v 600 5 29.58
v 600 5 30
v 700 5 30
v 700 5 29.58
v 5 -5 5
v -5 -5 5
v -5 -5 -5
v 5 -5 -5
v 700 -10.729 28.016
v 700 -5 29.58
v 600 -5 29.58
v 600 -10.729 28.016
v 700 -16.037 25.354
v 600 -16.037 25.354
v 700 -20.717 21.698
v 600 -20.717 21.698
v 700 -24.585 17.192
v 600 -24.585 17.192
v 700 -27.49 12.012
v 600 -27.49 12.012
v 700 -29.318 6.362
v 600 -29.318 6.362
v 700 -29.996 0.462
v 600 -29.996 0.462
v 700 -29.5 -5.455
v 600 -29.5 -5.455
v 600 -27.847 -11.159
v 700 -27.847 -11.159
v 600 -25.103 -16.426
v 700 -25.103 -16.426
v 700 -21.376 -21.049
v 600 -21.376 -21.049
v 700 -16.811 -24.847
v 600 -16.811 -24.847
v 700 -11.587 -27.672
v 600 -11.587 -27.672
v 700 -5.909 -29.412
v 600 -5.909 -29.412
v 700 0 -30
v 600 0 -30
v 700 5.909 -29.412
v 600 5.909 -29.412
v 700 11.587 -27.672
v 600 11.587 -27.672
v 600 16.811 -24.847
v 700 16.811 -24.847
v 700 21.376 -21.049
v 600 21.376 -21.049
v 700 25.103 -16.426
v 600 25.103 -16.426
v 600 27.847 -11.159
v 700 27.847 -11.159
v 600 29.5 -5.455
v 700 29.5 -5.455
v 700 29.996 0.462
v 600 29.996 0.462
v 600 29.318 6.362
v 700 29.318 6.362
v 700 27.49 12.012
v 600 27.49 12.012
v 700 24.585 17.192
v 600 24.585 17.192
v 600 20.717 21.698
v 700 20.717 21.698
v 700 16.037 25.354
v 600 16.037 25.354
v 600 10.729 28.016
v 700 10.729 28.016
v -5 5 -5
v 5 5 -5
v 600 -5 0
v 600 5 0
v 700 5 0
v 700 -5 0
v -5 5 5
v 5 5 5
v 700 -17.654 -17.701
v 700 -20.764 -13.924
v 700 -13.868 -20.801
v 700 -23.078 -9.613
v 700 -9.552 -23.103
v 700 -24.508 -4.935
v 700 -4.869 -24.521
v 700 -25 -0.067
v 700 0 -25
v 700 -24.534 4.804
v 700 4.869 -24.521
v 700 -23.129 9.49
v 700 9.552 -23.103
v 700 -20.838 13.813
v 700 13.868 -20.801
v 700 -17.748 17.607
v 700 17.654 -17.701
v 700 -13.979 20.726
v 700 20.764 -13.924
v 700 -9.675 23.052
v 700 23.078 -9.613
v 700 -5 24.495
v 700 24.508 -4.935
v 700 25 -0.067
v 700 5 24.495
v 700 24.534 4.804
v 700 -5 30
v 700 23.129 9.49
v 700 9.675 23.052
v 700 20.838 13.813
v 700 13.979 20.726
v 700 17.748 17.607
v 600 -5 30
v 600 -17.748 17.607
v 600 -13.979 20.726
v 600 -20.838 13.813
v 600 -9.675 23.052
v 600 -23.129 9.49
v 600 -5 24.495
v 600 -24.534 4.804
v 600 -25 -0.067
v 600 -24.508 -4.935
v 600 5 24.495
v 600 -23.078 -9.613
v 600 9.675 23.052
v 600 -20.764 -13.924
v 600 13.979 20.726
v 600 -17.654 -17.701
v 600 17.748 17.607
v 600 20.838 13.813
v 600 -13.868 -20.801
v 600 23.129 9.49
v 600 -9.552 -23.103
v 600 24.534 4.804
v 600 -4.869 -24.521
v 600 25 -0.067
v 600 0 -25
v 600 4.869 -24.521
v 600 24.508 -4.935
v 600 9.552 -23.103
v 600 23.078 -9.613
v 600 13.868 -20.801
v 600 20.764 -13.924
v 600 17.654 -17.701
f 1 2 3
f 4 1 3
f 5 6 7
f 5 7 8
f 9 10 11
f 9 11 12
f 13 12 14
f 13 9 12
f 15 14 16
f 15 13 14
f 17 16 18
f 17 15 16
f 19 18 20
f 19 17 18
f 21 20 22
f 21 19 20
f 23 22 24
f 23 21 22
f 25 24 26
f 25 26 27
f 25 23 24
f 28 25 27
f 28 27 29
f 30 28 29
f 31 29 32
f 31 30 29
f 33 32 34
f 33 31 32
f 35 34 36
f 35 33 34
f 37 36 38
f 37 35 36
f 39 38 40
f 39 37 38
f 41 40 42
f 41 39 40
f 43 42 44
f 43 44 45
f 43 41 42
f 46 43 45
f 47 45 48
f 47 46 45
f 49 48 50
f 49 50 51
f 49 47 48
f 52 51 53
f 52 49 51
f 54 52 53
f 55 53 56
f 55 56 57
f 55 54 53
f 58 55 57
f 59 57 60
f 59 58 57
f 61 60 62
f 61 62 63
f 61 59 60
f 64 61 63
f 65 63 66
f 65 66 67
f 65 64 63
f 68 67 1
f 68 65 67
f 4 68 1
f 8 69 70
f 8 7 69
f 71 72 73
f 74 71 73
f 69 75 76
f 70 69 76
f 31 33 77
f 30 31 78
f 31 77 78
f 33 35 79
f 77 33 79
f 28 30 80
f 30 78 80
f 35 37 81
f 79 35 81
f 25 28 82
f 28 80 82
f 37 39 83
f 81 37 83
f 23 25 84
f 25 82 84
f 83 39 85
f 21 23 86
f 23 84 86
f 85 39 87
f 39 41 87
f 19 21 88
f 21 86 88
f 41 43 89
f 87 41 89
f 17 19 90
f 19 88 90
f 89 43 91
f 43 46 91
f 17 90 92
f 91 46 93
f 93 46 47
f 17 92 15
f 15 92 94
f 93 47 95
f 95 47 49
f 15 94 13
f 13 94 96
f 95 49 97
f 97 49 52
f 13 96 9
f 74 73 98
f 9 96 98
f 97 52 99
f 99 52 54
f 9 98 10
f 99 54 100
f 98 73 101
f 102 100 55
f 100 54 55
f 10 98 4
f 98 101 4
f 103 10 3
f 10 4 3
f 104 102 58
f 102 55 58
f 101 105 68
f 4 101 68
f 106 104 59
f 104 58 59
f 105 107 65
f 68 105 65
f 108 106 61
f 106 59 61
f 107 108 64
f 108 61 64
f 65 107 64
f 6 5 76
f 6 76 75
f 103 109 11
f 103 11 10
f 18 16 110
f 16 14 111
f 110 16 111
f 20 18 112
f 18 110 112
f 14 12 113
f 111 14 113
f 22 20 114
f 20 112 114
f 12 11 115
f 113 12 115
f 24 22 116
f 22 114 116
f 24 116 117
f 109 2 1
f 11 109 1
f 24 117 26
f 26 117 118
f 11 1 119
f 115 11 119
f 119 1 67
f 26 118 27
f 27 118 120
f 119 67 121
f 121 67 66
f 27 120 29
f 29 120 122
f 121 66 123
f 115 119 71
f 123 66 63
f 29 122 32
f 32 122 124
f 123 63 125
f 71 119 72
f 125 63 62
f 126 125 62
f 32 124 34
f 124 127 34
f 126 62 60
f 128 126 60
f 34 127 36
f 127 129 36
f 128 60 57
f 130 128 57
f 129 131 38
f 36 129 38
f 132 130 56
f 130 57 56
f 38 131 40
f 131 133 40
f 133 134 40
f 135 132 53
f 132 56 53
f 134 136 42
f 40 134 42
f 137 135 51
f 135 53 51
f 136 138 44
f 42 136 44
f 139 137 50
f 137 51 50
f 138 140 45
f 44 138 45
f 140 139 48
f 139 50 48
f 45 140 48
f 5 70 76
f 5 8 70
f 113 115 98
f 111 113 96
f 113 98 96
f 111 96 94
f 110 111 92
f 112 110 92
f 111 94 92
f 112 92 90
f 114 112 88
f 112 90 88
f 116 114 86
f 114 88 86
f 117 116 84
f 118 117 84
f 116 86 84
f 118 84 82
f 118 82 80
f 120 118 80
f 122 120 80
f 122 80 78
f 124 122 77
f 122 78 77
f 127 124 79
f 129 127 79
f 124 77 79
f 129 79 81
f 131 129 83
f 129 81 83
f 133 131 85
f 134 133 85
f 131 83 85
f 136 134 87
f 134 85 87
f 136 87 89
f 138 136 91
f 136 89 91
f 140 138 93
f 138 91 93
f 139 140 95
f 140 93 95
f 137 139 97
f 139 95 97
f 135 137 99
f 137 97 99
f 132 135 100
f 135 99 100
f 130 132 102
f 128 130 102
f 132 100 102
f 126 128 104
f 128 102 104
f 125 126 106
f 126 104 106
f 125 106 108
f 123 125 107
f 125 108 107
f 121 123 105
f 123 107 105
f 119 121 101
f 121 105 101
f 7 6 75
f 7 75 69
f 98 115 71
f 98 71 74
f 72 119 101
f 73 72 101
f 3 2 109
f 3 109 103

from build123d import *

# Parameters (mm, degrees)
F0_W     = 100
F0_H     = 5
F0_H_2   = 25
F2_DEPTH = 5


with BuildPart() as f1:
    # F0 (on Front) → F1 (revolve)
    with BuildSketch(Plane.XZ):
        with Locations((650, 27.5)):
            Rectangle(F0_W, F0_H)
    revolve(axis=Axis((650, 0, 0), (1, 0, 0)))

    # F0 (on Front) → F2 (join, symmetric)
    with BuildSketch(Plane.XZ):
        with Locations((650, 12.5)):
            Rectangle(F0_W, F0_H_2)
        Polygon((5, -5), (5, 0), (5, 5), (-5, 5), (-5, -5), align=None)
        with Locations((650, 27.5)):
            Rectangle(F0_W, F0_H)
    extrude(amount=F2_DEPTH, both=True)


solid = f1.part
